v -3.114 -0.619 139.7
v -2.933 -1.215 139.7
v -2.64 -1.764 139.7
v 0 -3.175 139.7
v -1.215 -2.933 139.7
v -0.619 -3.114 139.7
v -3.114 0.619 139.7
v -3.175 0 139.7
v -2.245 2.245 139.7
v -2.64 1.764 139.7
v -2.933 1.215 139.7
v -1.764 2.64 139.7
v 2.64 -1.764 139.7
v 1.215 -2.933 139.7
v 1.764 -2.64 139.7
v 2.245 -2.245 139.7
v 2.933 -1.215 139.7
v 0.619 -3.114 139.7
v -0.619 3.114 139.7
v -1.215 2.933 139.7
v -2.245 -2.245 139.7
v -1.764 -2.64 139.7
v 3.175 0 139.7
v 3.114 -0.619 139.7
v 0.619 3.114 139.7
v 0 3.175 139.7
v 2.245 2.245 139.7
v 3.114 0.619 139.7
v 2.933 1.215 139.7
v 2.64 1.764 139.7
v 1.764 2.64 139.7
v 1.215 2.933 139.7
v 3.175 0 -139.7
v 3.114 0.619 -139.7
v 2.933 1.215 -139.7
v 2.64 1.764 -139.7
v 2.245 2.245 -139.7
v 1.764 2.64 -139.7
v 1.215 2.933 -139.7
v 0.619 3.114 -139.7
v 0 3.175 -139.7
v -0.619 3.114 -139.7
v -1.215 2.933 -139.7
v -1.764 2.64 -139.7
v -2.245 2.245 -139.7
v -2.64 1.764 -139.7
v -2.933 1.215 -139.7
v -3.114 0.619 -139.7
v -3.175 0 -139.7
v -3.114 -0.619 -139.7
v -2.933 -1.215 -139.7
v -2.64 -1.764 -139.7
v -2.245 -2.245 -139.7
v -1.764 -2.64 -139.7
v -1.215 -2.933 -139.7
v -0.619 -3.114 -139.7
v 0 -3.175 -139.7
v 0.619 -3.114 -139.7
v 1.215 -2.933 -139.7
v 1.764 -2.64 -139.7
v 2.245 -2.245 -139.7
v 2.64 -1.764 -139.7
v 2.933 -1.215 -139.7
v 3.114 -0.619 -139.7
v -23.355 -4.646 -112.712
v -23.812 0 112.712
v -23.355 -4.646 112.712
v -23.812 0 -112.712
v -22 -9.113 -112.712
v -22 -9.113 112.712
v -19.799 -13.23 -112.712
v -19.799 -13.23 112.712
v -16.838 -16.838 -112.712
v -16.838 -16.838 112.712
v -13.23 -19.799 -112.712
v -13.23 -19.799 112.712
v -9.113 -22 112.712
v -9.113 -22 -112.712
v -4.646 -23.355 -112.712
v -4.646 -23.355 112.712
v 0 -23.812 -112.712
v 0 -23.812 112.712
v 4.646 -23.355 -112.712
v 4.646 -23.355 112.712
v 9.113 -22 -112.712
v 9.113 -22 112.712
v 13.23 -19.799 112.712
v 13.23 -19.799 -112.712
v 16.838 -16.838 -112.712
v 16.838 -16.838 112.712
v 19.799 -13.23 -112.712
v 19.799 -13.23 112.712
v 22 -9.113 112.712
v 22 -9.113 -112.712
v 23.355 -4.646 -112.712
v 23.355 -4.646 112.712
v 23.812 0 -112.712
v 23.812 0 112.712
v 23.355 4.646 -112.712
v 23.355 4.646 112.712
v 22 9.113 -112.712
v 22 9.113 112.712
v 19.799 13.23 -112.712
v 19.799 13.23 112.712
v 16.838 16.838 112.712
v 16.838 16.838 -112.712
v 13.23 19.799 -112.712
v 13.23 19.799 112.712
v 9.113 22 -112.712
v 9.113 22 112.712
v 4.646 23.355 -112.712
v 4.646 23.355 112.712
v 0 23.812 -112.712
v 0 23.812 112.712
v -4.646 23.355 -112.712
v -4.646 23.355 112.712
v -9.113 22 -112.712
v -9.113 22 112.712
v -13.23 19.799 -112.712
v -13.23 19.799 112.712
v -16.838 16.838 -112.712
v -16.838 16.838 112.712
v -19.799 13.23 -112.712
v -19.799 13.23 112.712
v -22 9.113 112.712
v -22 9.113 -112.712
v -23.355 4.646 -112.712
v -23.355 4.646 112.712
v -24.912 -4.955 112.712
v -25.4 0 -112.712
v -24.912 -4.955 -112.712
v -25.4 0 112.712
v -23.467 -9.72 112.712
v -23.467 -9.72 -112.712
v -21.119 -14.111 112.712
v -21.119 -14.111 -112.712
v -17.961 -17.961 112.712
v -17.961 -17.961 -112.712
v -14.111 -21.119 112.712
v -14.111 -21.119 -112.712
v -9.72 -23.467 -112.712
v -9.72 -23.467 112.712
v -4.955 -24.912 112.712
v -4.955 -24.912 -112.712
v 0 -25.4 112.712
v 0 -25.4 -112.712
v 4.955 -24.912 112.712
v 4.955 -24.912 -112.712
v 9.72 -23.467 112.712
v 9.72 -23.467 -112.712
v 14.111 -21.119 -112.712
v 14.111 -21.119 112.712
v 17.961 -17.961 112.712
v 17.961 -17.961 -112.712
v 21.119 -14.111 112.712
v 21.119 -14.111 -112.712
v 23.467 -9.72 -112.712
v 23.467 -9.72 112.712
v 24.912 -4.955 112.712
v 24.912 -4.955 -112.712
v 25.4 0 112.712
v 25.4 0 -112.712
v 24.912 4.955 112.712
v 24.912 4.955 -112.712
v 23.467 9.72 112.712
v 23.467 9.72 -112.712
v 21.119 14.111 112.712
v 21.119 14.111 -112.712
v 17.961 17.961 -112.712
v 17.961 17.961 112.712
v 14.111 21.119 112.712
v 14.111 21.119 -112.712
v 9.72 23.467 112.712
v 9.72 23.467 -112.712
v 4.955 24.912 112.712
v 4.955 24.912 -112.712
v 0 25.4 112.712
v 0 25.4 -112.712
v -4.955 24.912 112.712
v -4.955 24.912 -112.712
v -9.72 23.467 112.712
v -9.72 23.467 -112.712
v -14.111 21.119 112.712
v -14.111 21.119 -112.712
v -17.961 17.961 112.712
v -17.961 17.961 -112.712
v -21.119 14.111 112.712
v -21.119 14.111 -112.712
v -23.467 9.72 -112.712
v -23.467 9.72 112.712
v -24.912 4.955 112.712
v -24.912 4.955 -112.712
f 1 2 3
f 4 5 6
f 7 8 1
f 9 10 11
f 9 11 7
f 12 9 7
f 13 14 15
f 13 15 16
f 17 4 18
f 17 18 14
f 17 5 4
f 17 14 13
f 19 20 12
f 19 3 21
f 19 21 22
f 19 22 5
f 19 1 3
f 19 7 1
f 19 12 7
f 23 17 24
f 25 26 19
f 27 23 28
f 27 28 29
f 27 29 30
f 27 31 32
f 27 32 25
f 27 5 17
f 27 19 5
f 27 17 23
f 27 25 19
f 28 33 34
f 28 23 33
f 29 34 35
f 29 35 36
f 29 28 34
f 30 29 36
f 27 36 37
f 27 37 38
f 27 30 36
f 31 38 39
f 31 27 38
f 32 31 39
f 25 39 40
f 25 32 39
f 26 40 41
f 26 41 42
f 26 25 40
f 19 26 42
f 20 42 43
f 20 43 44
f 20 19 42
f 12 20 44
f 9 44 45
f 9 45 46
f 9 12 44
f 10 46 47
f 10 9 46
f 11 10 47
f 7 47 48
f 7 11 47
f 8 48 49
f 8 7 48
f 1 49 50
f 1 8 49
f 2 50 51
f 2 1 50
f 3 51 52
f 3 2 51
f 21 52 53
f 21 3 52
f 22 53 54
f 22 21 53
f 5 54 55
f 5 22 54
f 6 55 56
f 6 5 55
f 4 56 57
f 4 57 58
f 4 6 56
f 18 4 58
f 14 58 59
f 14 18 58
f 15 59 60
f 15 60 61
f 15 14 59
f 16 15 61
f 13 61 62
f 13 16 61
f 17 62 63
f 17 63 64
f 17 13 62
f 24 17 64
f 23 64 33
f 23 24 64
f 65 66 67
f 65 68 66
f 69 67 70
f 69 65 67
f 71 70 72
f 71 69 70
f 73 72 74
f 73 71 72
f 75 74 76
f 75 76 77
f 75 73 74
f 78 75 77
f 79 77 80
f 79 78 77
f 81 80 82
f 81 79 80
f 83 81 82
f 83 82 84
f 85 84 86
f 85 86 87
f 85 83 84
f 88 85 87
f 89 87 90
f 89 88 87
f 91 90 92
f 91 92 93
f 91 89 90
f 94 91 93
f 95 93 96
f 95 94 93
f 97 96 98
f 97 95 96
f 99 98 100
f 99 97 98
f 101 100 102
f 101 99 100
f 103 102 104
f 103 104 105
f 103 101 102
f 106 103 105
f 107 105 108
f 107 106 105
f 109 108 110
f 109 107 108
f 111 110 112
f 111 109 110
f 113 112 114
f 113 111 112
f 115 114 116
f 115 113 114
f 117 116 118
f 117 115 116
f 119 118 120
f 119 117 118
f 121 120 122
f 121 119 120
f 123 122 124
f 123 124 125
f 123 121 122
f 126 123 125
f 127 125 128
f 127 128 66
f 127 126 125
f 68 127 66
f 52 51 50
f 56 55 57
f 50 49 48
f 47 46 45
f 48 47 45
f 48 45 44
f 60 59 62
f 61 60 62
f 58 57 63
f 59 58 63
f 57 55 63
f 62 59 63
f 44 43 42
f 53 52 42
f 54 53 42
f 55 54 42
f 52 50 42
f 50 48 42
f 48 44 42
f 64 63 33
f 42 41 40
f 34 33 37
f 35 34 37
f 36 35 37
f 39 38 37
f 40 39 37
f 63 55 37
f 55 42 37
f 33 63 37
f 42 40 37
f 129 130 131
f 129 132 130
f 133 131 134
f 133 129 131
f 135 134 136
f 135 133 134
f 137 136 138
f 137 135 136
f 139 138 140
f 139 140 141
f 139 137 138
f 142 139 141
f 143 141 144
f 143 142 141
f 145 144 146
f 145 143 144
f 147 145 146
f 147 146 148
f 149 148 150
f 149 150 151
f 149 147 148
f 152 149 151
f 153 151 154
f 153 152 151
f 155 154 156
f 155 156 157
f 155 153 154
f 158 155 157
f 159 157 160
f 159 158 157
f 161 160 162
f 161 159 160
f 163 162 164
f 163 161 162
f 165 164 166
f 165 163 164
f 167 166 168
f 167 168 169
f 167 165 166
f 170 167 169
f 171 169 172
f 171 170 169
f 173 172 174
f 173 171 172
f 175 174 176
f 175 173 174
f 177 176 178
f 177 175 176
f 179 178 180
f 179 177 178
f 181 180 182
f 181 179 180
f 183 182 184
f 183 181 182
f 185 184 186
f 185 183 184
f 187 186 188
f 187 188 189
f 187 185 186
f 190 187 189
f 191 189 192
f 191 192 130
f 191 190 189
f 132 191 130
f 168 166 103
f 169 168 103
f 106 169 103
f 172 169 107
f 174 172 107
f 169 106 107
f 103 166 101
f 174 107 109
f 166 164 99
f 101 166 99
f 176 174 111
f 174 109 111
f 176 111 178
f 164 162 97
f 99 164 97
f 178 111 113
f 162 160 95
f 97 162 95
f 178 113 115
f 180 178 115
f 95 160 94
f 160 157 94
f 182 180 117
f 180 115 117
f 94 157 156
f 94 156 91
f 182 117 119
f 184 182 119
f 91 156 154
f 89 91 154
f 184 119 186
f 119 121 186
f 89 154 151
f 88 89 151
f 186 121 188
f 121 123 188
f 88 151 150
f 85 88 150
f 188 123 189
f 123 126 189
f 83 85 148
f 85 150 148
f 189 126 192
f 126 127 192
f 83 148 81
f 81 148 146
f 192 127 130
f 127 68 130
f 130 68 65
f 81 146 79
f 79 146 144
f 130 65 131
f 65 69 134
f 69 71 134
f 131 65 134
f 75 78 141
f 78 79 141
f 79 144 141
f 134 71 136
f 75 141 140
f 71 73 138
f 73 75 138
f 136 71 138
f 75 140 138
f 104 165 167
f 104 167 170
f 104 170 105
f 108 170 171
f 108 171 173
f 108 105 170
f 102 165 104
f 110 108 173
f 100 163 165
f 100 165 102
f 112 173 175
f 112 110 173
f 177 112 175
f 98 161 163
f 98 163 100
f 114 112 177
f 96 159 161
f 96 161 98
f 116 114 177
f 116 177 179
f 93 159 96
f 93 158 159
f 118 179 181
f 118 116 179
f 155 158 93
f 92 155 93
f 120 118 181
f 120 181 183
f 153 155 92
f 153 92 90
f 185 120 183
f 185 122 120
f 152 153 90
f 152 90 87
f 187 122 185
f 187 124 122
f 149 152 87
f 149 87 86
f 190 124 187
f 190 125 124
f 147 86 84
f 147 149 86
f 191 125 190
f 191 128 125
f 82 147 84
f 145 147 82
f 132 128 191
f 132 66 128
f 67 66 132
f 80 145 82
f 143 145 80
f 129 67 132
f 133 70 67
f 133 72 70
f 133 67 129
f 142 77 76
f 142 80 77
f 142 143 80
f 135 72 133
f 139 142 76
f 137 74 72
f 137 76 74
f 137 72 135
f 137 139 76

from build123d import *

# Parameters (mm, degrees)
SKETCH1_R           = 3.175
BOSS_EXTRUDE1_DEPTH = 139.7
SKETCH2_R           = 25.4
SKETCH2_R_2         = 23.8125
BOSS_EXTRUDE2_DEPTH = 112.7125


with BuildPart() as part:
    # Sketch1 → Boss-Extrude1 (new, symmetric)
    with BuildSketch(Plane.XY):
        Circle(SKETCH1_R)
    extrude(amount=BOSS_EXTRUDE1_DEPTH, both=True)


with BuildPart() as body_2:
    # Sketch2 → Boss-Extrude2 (new, symmetric)
    with BuildSketch(Plane.XY):
        with Locations(Location((0, 0, 0), (0, 0, 180))):
            Circle(SKETCH2_R)
        with Locations(Location((0, 0, 0), (0, 0, 180))):
            Circle(SKETCH2_R_2, mode=Mode.SUBTRACT)
    extrude(amount=BOSS_EXTRUDE2_DEPTH, both=True)


solid = Compound([part.part, body_2.part])
